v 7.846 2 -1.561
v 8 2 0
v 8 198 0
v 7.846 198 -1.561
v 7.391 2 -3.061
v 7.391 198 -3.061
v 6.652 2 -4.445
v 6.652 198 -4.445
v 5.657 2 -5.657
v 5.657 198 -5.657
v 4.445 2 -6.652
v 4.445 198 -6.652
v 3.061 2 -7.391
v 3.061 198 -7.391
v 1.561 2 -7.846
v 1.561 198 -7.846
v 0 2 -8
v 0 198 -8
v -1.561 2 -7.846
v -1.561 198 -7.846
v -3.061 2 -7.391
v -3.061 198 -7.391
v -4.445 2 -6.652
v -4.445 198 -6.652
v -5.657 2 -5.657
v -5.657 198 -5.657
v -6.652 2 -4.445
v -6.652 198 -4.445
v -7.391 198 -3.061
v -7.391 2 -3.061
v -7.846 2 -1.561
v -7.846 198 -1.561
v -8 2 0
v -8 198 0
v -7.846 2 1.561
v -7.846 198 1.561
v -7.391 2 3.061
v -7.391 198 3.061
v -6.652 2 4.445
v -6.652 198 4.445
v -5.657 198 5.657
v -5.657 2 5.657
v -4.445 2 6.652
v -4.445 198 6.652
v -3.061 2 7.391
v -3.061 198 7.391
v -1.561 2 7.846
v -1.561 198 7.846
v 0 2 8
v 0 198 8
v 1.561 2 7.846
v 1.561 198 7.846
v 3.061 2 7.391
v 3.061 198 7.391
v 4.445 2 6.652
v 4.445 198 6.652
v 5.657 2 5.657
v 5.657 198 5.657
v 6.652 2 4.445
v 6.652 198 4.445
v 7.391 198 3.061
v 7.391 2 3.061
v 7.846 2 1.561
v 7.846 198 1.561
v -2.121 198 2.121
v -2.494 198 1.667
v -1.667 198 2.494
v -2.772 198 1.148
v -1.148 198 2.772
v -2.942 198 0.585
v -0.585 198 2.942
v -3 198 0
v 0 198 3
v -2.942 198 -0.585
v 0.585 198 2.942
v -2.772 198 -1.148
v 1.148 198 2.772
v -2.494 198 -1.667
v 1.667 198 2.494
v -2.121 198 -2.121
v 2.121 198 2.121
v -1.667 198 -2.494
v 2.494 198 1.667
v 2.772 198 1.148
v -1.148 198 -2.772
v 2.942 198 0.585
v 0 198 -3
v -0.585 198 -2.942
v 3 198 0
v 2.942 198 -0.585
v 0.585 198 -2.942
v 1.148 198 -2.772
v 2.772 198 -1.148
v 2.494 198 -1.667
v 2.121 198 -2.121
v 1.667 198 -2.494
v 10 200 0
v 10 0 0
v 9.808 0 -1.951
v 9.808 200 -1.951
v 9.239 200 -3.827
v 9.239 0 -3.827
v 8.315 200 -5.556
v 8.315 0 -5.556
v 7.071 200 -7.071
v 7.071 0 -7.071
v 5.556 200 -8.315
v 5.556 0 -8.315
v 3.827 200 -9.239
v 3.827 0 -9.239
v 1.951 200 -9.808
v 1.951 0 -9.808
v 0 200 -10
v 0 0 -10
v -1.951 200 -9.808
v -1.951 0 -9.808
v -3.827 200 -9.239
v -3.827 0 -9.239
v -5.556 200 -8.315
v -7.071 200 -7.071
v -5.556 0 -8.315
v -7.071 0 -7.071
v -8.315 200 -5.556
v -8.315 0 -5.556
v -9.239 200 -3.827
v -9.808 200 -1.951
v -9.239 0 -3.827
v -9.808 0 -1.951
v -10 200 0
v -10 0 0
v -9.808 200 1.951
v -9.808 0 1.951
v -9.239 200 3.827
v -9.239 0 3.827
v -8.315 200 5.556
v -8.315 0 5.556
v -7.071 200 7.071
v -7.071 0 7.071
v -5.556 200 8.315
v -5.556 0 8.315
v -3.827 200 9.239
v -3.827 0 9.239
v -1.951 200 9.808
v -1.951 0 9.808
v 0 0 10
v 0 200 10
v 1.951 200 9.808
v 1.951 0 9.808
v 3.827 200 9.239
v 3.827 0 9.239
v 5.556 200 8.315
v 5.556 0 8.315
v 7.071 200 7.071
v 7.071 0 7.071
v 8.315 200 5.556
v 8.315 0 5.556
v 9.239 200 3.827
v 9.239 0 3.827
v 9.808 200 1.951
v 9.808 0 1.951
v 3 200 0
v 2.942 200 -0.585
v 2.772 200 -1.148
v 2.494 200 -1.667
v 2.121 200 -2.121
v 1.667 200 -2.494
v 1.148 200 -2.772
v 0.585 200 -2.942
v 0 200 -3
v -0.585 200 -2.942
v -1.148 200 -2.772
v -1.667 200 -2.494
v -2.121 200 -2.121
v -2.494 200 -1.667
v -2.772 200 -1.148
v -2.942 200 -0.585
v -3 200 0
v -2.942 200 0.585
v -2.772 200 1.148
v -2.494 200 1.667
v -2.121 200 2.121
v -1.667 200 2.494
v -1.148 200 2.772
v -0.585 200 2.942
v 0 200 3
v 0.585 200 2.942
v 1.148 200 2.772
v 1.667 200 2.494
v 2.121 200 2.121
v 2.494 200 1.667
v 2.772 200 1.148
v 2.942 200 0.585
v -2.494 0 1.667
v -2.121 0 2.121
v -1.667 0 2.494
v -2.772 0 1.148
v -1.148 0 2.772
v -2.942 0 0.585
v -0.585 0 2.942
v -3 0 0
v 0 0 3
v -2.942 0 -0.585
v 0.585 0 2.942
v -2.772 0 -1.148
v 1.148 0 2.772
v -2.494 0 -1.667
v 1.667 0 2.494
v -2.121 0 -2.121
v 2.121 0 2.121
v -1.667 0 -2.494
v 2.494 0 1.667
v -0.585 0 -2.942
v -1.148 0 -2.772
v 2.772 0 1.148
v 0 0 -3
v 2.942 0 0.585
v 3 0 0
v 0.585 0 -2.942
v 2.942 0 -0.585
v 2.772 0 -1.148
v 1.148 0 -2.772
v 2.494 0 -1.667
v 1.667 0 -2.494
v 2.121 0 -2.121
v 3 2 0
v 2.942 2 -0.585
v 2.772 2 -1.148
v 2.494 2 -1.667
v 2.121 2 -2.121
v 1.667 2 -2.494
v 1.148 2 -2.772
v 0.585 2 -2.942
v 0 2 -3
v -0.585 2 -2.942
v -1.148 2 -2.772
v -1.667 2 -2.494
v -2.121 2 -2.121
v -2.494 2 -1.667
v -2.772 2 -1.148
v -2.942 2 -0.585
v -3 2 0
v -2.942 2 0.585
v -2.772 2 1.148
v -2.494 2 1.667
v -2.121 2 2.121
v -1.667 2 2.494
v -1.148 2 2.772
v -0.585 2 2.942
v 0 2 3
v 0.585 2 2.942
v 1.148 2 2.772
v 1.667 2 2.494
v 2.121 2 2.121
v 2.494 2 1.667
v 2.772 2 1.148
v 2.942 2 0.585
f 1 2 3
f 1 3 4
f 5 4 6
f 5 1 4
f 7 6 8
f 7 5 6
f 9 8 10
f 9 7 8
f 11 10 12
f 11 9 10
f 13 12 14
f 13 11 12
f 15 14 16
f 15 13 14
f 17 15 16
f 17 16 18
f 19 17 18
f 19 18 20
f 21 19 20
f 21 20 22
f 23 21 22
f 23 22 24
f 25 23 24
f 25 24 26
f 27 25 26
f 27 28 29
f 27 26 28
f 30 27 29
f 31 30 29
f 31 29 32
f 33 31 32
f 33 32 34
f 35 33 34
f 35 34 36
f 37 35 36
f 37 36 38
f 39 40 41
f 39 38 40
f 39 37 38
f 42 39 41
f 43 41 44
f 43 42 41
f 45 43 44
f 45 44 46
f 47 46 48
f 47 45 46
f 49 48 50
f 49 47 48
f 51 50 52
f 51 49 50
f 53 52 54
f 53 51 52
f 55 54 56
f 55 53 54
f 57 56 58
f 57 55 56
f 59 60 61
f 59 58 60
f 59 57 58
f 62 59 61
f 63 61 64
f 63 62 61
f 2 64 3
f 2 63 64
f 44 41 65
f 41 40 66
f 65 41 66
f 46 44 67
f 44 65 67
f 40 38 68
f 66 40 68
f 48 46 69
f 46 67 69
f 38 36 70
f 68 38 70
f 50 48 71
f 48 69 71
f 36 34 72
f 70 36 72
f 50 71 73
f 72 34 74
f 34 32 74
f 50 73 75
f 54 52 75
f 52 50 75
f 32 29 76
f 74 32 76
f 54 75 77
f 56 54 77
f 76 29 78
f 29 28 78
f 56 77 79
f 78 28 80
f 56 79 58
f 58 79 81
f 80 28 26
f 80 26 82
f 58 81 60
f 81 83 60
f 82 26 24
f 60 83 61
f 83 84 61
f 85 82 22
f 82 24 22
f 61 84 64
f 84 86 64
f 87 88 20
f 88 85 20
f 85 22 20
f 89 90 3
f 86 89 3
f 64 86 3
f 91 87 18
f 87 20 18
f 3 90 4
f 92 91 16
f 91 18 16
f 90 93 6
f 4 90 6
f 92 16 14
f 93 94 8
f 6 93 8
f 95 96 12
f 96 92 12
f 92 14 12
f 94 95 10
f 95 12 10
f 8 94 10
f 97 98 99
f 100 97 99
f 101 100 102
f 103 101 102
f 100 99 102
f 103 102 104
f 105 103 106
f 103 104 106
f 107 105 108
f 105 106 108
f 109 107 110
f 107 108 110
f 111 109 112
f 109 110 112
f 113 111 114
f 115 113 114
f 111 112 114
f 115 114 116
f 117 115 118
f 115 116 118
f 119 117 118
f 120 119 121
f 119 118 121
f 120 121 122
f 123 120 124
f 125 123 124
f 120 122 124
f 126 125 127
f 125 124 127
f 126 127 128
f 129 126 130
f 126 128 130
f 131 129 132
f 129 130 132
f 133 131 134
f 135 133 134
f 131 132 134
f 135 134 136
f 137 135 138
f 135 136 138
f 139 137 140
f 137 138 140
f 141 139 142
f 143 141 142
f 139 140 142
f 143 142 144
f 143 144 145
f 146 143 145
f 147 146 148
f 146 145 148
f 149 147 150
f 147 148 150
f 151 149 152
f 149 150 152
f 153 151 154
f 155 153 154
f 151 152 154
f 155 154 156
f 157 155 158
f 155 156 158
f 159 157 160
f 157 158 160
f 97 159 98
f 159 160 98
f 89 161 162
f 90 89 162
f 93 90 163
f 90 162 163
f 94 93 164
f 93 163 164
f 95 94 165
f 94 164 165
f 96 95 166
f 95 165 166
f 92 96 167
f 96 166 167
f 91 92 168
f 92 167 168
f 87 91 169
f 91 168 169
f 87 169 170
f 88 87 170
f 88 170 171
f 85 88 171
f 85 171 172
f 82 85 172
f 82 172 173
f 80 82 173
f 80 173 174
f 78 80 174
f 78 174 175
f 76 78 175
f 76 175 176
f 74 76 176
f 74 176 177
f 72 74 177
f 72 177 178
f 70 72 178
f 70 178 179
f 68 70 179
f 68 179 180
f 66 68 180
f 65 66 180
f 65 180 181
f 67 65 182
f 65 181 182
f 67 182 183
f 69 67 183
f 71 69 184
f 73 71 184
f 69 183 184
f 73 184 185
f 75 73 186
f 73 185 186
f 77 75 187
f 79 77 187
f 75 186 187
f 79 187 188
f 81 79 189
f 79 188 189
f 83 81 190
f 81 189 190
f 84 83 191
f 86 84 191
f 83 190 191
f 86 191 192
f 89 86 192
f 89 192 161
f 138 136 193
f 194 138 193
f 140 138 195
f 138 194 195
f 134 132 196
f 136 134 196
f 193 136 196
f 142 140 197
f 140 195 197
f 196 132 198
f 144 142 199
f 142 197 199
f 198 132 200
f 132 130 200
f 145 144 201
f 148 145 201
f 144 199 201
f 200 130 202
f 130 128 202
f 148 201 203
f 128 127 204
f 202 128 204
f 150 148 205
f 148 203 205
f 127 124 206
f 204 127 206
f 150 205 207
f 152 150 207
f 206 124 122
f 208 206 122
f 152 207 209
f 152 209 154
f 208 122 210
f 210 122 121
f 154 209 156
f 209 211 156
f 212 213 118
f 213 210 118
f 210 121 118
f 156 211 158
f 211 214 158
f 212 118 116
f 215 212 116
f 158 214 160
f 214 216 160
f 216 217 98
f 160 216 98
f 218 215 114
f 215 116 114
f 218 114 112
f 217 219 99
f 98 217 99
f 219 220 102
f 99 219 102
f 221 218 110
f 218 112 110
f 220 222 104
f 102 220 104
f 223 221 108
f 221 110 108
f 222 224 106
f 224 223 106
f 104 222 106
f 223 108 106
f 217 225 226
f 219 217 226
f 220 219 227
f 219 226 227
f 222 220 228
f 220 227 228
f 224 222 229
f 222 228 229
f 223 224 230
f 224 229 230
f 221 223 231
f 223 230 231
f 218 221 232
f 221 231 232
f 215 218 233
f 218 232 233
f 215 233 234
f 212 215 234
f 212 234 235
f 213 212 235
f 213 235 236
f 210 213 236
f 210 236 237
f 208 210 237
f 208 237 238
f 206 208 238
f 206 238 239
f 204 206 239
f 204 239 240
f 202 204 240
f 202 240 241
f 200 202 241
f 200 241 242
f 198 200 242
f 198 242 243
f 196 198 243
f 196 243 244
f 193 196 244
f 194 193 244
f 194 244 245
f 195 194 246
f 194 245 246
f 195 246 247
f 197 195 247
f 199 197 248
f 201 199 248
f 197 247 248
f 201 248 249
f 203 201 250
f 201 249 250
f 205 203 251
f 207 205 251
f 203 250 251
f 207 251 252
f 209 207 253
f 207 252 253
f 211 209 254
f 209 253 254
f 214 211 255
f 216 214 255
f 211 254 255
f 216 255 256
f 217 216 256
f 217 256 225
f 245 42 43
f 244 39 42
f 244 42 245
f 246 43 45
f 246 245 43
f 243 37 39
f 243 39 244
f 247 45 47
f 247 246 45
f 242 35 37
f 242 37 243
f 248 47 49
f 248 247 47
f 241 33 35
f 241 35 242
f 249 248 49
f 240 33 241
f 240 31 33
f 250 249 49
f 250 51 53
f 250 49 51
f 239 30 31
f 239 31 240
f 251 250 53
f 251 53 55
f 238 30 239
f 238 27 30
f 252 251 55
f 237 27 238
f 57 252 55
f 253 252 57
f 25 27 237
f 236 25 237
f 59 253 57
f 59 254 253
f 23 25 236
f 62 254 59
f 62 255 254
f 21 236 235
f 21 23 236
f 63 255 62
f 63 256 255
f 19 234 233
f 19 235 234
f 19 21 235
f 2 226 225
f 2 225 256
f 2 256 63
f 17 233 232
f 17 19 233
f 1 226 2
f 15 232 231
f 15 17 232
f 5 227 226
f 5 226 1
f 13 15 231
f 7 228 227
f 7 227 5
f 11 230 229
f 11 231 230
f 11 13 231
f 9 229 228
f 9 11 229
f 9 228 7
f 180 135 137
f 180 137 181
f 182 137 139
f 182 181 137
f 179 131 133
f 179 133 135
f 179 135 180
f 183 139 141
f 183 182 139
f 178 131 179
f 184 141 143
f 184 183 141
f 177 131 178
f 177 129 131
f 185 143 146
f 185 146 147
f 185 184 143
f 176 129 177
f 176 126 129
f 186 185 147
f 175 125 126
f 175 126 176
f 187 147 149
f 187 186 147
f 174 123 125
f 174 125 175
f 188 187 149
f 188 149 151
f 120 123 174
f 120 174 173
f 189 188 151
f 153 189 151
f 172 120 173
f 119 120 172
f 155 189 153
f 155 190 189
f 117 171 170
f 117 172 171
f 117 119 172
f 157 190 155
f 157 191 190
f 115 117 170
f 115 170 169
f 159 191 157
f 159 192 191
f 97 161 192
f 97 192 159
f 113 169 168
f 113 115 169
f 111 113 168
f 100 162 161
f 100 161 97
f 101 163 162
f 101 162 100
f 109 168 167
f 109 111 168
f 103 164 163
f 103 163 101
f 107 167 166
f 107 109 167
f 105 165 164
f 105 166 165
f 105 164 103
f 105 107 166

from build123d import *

# Parameters (mm, degrees)
SKETCH1_R               = 10
BOSS_EXTRUDE1_DEPTH     = 200
SHELL1_T                = 2
SKETCH2_R               = 3
CUT_EXTRUDE1_DEPTH      = 1
CUT_EXTRUDE1_DEPTH_BACK = 201


with BuildPart() as part:
    # Sketch1 → Boss-Extrude1 (new body)
    with BuildSketch(Plane(origin=(0, 0, 0), x_dir=(1, 0, 0), z_dir=(0, 1, 0))):
        Circle(SKETCH1_R)
    extrude(amount=BOSS_EXTRUDE1_DEPTH)

    # Shell1 (no face opened: a closed hollow body)
    add(offset(amount=-SHELL1_T, mode=Mode.PRIVATE), mode=Mode.SUBTRACT)

    # Sketch2 → Cut-Extrude1 (cut, two sides)
    with BuildSketch(Plane(origin=(0, 200, 0), x_dir=(1, 0, 0), z_dir=(0, 1, 0))) as cut_extrude1_sk:
        Circle(SKETCH2_R)
    extrude(amount=CUT_EXTRUDE1_DEPTH, mode=Mode.SUBTRACT)
    extrude(cut_extrude1_sk.sketch, amount=-CUT_EXTRUDE1_DEPTH_BACK, mode=Mode.SUBTRACT)


solid = part.part
